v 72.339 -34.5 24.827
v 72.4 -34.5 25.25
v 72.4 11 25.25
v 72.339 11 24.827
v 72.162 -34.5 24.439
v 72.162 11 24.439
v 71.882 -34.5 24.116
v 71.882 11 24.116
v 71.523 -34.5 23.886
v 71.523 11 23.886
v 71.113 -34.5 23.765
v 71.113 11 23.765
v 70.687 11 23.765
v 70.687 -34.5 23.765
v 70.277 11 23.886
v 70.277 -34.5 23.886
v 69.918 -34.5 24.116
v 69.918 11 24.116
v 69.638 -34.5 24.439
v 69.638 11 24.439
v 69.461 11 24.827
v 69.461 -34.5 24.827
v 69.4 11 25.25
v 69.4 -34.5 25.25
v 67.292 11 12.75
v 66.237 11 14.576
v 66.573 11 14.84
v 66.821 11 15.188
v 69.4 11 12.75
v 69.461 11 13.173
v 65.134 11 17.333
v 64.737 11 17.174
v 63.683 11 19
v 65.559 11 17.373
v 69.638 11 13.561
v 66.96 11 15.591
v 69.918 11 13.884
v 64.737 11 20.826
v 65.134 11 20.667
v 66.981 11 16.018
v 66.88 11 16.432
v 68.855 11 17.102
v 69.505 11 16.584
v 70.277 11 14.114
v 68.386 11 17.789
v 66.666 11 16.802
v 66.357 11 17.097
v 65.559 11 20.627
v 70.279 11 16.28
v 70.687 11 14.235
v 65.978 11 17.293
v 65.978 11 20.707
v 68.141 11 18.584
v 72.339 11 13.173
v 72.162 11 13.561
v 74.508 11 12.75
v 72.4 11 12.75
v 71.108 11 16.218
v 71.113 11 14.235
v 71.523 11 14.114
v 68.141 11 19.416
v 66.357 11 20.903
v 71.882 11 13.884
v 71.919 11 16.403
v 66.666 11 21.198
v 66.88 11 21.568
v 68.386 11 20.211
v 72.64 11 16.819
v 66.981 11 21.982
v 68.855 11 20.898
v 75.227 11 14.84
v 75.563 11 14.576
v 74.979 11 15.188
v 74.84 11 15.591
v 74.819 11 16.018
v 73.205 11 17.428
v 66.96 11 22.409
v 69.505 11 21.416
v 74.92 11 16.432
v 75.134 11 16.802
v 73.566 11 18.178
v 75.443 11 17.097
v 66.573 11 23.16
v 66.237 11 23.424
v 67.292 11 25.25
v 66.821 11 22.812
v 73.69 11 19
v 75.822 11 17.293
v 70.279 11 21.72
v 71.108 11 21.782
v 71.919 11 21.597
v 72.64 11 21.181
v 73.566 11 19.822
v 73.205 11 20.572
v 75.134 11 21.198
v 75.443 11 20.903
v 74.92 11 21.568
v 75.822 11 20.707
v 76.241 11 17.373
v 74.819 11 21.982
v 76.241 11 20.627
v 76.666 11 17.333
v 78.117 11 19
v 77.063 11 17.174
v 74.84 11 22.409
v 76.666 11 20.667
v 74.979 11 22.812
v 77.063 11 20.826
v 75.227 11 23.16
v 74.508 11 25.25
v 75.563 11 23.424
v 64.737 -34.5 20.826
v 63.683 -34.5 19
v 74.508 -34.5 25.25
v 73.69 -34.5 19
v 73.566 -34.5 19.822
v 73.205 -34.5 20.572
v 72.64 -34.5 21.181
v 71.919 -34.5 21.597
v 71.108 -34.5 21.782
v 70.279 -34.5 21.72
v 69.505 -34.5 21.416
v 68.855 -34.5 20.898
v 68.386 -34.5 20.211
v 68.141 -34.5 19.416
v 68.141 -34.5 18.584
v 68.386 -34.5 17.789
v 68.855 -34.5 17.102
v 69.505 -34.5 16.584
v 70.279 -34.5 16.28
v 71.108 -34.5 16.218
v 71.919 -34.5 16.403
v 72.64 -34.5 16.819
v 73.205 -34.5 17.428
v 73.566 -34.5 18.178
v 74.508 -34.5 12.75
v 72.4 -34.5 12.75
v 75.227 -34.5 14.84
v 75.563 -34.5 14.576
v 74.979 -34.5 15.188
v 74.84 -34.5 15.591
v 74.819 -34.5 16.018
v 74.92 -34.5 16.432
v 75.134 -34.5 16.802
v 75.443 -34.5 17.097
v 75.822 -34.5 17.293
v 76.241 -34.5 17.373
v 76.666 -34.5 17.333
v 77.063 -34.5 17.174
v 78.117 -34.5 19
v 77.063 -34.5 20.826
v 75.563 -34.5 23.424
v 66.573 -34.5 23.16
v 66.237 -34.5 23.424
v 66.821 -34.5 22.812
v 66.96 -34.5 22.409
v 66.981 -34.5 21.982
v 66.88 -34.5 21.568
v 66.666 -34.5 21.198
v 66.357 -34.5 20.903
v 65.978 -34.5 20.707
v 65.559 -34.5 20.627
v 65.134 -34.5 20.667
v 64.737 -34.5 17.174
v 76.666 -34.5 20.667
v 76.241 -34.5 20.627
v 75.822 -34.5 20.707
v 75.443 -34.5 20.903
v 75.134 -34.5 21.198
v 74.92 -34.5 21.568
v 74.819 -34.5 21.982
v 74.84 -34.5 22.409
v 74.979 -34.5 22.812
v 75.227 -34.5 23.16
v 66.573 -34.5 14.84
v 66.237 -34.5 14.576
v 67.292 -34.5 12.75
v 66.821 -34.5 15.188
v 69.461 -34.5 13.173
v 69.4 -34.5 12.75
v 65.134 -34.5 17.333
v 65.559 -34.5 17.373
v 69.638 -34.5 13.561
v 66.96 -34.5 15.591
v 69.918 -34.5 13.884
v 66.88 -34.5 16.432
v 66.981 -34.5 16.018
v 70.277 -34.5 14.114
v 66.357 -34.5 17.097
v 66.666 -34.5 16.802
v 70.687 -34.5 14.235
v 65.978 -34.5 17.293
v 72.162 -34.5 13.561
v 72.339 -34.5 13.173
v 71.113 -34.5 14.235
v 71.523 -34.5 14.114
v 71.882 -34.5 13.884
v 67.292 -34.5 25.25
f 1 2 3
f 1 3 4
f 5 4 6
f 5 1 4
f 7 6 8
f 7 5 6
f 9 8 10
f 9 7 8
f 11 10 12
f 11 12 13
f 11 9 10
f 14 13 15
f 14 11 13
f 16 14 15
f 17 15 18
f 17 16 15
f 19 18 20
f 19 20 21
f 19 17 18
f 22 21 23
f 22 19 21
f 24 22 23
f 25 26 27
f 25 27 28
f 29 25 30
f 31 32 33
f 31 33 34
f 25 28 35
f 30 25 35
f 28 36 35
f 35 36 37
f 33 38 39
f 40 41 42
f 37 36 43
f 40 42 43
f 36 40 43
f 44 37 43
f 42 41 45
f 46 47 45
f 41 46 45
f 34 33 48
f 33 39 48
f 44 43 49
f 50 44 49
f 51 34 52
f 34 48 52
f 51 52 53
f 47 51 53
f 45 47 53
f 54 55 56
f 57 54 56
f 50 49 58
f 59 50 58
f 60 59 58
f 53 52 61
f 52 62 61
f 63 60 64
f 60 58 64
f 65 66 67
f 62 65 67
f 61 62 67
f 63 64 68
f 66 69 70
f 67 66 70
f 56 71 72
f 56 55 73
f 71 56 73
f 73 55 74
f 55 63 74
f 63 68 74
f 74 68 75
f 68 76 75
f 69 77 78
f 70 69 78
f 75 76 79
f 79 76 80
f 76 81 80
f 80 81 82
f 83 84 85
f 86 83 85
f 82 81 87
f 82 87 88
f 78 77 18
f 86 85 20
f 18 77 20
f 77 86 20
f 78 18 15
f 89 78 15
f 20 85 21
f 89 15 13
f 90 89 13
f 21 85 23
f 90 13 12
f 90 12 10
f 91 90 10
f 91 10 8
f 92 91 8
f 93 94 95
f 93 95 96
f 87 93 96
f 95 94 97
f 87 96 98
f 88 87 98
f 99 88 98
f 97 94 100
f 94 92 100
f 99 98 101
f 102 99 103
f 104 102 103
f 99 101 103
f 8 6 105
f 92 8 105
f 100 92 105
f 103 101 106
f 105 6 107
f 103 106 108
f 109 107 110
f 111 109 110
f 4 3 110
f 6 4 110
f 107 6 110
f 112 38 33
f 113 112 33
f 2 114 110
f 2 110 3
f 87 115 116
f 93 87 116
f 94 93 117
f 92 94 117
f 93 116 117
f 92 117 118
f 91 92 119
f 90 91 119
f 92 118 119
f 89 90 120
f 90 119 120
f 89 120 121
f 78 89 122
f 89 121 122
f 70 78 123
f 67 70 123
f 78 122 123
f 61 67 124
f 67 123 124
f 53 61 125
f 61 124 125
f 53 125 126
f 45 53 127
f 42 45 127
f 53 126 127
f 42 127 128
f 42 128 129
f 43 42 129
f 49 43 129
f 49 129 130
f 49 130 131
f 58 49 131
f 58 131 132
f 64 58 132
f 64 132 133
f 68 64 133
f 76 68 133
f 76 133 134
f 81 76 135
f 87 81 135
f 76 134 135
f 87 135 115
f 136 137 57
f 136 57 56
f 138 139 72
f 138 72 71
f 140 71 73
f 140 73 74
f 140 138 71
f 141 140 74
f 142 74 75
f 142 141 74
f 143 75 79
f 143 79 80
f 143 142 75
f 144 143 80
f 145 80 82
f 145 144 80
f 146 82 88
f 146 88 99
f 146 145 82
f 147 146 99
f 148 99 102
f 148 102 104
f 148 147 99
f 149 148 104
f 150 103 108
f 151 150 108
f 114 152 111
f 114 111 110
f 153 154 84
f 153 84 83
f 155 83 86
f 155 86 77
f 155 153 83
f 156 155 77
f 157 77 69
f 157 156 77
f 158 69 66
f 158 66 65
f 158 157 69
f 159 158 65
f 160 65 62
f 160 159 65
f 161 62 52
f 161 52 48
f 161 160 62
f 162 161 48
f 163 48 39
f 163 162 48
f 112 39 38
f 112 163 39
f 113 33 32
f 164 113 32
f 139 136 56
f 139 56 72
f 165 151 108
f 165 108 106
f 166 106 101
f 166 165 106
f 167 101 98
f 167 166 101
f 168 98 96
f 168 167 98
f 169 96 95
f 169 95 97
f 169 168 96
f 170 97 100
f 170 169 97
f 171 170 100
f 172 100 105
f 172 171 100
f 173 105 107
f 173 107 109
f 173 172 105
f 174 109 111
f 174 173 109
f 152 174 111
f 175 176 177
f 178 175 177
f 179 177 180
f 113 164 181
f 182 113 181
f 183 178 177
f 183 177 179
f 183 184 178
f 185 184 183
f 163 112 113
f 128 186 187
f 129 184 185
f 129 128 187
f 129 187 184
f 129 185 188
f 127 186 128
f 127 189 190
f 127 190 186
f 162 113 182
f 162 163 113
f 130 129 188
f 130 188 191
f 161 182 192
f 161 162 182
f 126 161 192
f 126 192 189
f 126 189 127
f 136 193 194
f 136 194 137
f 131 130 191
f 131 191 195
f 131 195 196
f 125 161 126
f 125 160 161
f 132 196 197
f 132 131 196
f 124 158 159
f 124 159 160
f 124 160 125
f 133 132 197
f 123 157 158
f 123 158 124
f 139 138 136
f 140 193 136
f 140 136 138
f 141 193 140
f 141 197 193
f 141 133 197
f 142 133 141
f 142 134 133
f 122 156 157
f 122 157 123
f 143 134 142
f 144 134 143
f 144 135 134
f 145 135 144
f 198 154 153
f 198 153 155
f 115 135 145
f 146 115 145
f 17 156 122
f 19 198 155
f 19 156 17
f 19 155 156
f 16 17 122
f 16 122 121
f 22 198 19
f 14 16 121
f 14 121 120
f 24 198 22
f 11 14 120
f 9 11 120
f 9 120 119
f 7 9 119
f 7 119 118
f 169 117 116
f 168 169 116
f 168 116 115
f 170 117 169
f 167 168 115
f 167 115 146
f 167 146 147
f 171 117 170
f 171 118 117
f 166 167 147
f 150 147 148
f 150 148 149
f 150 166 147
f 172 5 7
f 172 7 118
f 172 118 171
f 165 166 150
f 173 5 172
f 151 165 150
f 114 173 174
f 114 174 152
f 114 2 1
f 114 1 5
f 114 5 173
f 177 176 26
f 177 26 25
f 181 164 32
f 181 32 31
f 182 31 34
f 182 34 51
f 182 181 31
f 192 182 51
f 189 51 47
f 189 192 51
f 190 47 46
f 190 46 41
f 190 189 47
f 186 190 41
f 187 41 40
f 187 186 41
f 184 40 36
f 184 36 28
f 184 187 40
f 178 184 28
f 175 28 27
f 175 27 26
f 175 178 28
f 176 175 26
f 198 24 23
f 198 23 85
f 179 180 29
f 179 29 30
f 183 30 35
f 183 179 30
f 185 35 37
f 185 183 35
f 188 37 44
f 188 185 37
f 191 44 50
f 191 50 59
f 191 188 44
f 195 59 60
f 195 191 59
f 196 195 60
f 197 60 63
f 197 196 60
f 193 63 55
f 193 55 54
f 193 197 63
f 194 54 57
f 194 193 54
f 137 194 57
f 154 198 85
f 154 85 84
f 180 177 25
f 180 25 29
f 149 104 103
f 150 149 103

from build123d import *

# Parameters (mm, degrees)
ESBO_O1_R                = 2.79
RESSALTO_EXTRUS_O1_DEPTH = 45.5


with BuildPart() as part:
    # Esboço1 → Ressalto-extrusão1 (new body)
    with BuildSketch(Plane.XZ.offset(34.5)):
        with BuildLine():
            Line((77.062658774, 17.174038106), (78.116878365, 19))
            Line((78.116878365, 19), (77.062658774, 20.825961894))
            ThreePointArc((77.062658774, 20.825961894), (75.013620668, 21.375), (75.562658774, 23.424038106))
            Line((75.562658774, 23.424038106), (74.508439182, 25.25))
            Line((74.508439182, 25.25), (72.4, 25.25))
            ThreePointArc((72.4, 25.25), (70.9, 23.75), (69.4, 25.25))
            Line((69.4, 25.25), (67.291560818, 25.25))
            Line((67.291560818, 25.25), (66.237341226, 23.424038106))
            ThreePointArc((66.237341226, 23.424038106), (66.786379332, 21.375), (64.737341226, 20.825961894))
            Line((64.737341226, 20.825961894), (63.683121635, 19))
            Line((63.683121635, 19), (64.737341226, 17.174038106))
            ThreePointArc((64.737341226, 17.174038106), (66.786379332, 16.625), (66.237341226, 14.575961894))
            Line((66.237341226, 14.575961894), (67.291560818, 12.75))
            Line((67.291560818, 12.75), (69.4, 12.75))
            ThreePointArc((69.4, 12.75), (70.9, 14.25), (72.4, 12.75))
            Line((72.4, 12.75), (74.508439182, 12.75))
            Line((74.508439182, 12.75), (75.562658774, 14.575961894))
            ThreePointArc((75.562658774, 14.575961894), (75.013620668, 16.625), (77.062658774, 17.174038106))
        make_face()
        with Locations((70.9, 19)):
            Circle(ESBO_O1_R, mode=Mode.SUBTRACT)
    extrude(amount=-RESSALTO_EXTRUS_O1_DEPTH)


solid = part.part
